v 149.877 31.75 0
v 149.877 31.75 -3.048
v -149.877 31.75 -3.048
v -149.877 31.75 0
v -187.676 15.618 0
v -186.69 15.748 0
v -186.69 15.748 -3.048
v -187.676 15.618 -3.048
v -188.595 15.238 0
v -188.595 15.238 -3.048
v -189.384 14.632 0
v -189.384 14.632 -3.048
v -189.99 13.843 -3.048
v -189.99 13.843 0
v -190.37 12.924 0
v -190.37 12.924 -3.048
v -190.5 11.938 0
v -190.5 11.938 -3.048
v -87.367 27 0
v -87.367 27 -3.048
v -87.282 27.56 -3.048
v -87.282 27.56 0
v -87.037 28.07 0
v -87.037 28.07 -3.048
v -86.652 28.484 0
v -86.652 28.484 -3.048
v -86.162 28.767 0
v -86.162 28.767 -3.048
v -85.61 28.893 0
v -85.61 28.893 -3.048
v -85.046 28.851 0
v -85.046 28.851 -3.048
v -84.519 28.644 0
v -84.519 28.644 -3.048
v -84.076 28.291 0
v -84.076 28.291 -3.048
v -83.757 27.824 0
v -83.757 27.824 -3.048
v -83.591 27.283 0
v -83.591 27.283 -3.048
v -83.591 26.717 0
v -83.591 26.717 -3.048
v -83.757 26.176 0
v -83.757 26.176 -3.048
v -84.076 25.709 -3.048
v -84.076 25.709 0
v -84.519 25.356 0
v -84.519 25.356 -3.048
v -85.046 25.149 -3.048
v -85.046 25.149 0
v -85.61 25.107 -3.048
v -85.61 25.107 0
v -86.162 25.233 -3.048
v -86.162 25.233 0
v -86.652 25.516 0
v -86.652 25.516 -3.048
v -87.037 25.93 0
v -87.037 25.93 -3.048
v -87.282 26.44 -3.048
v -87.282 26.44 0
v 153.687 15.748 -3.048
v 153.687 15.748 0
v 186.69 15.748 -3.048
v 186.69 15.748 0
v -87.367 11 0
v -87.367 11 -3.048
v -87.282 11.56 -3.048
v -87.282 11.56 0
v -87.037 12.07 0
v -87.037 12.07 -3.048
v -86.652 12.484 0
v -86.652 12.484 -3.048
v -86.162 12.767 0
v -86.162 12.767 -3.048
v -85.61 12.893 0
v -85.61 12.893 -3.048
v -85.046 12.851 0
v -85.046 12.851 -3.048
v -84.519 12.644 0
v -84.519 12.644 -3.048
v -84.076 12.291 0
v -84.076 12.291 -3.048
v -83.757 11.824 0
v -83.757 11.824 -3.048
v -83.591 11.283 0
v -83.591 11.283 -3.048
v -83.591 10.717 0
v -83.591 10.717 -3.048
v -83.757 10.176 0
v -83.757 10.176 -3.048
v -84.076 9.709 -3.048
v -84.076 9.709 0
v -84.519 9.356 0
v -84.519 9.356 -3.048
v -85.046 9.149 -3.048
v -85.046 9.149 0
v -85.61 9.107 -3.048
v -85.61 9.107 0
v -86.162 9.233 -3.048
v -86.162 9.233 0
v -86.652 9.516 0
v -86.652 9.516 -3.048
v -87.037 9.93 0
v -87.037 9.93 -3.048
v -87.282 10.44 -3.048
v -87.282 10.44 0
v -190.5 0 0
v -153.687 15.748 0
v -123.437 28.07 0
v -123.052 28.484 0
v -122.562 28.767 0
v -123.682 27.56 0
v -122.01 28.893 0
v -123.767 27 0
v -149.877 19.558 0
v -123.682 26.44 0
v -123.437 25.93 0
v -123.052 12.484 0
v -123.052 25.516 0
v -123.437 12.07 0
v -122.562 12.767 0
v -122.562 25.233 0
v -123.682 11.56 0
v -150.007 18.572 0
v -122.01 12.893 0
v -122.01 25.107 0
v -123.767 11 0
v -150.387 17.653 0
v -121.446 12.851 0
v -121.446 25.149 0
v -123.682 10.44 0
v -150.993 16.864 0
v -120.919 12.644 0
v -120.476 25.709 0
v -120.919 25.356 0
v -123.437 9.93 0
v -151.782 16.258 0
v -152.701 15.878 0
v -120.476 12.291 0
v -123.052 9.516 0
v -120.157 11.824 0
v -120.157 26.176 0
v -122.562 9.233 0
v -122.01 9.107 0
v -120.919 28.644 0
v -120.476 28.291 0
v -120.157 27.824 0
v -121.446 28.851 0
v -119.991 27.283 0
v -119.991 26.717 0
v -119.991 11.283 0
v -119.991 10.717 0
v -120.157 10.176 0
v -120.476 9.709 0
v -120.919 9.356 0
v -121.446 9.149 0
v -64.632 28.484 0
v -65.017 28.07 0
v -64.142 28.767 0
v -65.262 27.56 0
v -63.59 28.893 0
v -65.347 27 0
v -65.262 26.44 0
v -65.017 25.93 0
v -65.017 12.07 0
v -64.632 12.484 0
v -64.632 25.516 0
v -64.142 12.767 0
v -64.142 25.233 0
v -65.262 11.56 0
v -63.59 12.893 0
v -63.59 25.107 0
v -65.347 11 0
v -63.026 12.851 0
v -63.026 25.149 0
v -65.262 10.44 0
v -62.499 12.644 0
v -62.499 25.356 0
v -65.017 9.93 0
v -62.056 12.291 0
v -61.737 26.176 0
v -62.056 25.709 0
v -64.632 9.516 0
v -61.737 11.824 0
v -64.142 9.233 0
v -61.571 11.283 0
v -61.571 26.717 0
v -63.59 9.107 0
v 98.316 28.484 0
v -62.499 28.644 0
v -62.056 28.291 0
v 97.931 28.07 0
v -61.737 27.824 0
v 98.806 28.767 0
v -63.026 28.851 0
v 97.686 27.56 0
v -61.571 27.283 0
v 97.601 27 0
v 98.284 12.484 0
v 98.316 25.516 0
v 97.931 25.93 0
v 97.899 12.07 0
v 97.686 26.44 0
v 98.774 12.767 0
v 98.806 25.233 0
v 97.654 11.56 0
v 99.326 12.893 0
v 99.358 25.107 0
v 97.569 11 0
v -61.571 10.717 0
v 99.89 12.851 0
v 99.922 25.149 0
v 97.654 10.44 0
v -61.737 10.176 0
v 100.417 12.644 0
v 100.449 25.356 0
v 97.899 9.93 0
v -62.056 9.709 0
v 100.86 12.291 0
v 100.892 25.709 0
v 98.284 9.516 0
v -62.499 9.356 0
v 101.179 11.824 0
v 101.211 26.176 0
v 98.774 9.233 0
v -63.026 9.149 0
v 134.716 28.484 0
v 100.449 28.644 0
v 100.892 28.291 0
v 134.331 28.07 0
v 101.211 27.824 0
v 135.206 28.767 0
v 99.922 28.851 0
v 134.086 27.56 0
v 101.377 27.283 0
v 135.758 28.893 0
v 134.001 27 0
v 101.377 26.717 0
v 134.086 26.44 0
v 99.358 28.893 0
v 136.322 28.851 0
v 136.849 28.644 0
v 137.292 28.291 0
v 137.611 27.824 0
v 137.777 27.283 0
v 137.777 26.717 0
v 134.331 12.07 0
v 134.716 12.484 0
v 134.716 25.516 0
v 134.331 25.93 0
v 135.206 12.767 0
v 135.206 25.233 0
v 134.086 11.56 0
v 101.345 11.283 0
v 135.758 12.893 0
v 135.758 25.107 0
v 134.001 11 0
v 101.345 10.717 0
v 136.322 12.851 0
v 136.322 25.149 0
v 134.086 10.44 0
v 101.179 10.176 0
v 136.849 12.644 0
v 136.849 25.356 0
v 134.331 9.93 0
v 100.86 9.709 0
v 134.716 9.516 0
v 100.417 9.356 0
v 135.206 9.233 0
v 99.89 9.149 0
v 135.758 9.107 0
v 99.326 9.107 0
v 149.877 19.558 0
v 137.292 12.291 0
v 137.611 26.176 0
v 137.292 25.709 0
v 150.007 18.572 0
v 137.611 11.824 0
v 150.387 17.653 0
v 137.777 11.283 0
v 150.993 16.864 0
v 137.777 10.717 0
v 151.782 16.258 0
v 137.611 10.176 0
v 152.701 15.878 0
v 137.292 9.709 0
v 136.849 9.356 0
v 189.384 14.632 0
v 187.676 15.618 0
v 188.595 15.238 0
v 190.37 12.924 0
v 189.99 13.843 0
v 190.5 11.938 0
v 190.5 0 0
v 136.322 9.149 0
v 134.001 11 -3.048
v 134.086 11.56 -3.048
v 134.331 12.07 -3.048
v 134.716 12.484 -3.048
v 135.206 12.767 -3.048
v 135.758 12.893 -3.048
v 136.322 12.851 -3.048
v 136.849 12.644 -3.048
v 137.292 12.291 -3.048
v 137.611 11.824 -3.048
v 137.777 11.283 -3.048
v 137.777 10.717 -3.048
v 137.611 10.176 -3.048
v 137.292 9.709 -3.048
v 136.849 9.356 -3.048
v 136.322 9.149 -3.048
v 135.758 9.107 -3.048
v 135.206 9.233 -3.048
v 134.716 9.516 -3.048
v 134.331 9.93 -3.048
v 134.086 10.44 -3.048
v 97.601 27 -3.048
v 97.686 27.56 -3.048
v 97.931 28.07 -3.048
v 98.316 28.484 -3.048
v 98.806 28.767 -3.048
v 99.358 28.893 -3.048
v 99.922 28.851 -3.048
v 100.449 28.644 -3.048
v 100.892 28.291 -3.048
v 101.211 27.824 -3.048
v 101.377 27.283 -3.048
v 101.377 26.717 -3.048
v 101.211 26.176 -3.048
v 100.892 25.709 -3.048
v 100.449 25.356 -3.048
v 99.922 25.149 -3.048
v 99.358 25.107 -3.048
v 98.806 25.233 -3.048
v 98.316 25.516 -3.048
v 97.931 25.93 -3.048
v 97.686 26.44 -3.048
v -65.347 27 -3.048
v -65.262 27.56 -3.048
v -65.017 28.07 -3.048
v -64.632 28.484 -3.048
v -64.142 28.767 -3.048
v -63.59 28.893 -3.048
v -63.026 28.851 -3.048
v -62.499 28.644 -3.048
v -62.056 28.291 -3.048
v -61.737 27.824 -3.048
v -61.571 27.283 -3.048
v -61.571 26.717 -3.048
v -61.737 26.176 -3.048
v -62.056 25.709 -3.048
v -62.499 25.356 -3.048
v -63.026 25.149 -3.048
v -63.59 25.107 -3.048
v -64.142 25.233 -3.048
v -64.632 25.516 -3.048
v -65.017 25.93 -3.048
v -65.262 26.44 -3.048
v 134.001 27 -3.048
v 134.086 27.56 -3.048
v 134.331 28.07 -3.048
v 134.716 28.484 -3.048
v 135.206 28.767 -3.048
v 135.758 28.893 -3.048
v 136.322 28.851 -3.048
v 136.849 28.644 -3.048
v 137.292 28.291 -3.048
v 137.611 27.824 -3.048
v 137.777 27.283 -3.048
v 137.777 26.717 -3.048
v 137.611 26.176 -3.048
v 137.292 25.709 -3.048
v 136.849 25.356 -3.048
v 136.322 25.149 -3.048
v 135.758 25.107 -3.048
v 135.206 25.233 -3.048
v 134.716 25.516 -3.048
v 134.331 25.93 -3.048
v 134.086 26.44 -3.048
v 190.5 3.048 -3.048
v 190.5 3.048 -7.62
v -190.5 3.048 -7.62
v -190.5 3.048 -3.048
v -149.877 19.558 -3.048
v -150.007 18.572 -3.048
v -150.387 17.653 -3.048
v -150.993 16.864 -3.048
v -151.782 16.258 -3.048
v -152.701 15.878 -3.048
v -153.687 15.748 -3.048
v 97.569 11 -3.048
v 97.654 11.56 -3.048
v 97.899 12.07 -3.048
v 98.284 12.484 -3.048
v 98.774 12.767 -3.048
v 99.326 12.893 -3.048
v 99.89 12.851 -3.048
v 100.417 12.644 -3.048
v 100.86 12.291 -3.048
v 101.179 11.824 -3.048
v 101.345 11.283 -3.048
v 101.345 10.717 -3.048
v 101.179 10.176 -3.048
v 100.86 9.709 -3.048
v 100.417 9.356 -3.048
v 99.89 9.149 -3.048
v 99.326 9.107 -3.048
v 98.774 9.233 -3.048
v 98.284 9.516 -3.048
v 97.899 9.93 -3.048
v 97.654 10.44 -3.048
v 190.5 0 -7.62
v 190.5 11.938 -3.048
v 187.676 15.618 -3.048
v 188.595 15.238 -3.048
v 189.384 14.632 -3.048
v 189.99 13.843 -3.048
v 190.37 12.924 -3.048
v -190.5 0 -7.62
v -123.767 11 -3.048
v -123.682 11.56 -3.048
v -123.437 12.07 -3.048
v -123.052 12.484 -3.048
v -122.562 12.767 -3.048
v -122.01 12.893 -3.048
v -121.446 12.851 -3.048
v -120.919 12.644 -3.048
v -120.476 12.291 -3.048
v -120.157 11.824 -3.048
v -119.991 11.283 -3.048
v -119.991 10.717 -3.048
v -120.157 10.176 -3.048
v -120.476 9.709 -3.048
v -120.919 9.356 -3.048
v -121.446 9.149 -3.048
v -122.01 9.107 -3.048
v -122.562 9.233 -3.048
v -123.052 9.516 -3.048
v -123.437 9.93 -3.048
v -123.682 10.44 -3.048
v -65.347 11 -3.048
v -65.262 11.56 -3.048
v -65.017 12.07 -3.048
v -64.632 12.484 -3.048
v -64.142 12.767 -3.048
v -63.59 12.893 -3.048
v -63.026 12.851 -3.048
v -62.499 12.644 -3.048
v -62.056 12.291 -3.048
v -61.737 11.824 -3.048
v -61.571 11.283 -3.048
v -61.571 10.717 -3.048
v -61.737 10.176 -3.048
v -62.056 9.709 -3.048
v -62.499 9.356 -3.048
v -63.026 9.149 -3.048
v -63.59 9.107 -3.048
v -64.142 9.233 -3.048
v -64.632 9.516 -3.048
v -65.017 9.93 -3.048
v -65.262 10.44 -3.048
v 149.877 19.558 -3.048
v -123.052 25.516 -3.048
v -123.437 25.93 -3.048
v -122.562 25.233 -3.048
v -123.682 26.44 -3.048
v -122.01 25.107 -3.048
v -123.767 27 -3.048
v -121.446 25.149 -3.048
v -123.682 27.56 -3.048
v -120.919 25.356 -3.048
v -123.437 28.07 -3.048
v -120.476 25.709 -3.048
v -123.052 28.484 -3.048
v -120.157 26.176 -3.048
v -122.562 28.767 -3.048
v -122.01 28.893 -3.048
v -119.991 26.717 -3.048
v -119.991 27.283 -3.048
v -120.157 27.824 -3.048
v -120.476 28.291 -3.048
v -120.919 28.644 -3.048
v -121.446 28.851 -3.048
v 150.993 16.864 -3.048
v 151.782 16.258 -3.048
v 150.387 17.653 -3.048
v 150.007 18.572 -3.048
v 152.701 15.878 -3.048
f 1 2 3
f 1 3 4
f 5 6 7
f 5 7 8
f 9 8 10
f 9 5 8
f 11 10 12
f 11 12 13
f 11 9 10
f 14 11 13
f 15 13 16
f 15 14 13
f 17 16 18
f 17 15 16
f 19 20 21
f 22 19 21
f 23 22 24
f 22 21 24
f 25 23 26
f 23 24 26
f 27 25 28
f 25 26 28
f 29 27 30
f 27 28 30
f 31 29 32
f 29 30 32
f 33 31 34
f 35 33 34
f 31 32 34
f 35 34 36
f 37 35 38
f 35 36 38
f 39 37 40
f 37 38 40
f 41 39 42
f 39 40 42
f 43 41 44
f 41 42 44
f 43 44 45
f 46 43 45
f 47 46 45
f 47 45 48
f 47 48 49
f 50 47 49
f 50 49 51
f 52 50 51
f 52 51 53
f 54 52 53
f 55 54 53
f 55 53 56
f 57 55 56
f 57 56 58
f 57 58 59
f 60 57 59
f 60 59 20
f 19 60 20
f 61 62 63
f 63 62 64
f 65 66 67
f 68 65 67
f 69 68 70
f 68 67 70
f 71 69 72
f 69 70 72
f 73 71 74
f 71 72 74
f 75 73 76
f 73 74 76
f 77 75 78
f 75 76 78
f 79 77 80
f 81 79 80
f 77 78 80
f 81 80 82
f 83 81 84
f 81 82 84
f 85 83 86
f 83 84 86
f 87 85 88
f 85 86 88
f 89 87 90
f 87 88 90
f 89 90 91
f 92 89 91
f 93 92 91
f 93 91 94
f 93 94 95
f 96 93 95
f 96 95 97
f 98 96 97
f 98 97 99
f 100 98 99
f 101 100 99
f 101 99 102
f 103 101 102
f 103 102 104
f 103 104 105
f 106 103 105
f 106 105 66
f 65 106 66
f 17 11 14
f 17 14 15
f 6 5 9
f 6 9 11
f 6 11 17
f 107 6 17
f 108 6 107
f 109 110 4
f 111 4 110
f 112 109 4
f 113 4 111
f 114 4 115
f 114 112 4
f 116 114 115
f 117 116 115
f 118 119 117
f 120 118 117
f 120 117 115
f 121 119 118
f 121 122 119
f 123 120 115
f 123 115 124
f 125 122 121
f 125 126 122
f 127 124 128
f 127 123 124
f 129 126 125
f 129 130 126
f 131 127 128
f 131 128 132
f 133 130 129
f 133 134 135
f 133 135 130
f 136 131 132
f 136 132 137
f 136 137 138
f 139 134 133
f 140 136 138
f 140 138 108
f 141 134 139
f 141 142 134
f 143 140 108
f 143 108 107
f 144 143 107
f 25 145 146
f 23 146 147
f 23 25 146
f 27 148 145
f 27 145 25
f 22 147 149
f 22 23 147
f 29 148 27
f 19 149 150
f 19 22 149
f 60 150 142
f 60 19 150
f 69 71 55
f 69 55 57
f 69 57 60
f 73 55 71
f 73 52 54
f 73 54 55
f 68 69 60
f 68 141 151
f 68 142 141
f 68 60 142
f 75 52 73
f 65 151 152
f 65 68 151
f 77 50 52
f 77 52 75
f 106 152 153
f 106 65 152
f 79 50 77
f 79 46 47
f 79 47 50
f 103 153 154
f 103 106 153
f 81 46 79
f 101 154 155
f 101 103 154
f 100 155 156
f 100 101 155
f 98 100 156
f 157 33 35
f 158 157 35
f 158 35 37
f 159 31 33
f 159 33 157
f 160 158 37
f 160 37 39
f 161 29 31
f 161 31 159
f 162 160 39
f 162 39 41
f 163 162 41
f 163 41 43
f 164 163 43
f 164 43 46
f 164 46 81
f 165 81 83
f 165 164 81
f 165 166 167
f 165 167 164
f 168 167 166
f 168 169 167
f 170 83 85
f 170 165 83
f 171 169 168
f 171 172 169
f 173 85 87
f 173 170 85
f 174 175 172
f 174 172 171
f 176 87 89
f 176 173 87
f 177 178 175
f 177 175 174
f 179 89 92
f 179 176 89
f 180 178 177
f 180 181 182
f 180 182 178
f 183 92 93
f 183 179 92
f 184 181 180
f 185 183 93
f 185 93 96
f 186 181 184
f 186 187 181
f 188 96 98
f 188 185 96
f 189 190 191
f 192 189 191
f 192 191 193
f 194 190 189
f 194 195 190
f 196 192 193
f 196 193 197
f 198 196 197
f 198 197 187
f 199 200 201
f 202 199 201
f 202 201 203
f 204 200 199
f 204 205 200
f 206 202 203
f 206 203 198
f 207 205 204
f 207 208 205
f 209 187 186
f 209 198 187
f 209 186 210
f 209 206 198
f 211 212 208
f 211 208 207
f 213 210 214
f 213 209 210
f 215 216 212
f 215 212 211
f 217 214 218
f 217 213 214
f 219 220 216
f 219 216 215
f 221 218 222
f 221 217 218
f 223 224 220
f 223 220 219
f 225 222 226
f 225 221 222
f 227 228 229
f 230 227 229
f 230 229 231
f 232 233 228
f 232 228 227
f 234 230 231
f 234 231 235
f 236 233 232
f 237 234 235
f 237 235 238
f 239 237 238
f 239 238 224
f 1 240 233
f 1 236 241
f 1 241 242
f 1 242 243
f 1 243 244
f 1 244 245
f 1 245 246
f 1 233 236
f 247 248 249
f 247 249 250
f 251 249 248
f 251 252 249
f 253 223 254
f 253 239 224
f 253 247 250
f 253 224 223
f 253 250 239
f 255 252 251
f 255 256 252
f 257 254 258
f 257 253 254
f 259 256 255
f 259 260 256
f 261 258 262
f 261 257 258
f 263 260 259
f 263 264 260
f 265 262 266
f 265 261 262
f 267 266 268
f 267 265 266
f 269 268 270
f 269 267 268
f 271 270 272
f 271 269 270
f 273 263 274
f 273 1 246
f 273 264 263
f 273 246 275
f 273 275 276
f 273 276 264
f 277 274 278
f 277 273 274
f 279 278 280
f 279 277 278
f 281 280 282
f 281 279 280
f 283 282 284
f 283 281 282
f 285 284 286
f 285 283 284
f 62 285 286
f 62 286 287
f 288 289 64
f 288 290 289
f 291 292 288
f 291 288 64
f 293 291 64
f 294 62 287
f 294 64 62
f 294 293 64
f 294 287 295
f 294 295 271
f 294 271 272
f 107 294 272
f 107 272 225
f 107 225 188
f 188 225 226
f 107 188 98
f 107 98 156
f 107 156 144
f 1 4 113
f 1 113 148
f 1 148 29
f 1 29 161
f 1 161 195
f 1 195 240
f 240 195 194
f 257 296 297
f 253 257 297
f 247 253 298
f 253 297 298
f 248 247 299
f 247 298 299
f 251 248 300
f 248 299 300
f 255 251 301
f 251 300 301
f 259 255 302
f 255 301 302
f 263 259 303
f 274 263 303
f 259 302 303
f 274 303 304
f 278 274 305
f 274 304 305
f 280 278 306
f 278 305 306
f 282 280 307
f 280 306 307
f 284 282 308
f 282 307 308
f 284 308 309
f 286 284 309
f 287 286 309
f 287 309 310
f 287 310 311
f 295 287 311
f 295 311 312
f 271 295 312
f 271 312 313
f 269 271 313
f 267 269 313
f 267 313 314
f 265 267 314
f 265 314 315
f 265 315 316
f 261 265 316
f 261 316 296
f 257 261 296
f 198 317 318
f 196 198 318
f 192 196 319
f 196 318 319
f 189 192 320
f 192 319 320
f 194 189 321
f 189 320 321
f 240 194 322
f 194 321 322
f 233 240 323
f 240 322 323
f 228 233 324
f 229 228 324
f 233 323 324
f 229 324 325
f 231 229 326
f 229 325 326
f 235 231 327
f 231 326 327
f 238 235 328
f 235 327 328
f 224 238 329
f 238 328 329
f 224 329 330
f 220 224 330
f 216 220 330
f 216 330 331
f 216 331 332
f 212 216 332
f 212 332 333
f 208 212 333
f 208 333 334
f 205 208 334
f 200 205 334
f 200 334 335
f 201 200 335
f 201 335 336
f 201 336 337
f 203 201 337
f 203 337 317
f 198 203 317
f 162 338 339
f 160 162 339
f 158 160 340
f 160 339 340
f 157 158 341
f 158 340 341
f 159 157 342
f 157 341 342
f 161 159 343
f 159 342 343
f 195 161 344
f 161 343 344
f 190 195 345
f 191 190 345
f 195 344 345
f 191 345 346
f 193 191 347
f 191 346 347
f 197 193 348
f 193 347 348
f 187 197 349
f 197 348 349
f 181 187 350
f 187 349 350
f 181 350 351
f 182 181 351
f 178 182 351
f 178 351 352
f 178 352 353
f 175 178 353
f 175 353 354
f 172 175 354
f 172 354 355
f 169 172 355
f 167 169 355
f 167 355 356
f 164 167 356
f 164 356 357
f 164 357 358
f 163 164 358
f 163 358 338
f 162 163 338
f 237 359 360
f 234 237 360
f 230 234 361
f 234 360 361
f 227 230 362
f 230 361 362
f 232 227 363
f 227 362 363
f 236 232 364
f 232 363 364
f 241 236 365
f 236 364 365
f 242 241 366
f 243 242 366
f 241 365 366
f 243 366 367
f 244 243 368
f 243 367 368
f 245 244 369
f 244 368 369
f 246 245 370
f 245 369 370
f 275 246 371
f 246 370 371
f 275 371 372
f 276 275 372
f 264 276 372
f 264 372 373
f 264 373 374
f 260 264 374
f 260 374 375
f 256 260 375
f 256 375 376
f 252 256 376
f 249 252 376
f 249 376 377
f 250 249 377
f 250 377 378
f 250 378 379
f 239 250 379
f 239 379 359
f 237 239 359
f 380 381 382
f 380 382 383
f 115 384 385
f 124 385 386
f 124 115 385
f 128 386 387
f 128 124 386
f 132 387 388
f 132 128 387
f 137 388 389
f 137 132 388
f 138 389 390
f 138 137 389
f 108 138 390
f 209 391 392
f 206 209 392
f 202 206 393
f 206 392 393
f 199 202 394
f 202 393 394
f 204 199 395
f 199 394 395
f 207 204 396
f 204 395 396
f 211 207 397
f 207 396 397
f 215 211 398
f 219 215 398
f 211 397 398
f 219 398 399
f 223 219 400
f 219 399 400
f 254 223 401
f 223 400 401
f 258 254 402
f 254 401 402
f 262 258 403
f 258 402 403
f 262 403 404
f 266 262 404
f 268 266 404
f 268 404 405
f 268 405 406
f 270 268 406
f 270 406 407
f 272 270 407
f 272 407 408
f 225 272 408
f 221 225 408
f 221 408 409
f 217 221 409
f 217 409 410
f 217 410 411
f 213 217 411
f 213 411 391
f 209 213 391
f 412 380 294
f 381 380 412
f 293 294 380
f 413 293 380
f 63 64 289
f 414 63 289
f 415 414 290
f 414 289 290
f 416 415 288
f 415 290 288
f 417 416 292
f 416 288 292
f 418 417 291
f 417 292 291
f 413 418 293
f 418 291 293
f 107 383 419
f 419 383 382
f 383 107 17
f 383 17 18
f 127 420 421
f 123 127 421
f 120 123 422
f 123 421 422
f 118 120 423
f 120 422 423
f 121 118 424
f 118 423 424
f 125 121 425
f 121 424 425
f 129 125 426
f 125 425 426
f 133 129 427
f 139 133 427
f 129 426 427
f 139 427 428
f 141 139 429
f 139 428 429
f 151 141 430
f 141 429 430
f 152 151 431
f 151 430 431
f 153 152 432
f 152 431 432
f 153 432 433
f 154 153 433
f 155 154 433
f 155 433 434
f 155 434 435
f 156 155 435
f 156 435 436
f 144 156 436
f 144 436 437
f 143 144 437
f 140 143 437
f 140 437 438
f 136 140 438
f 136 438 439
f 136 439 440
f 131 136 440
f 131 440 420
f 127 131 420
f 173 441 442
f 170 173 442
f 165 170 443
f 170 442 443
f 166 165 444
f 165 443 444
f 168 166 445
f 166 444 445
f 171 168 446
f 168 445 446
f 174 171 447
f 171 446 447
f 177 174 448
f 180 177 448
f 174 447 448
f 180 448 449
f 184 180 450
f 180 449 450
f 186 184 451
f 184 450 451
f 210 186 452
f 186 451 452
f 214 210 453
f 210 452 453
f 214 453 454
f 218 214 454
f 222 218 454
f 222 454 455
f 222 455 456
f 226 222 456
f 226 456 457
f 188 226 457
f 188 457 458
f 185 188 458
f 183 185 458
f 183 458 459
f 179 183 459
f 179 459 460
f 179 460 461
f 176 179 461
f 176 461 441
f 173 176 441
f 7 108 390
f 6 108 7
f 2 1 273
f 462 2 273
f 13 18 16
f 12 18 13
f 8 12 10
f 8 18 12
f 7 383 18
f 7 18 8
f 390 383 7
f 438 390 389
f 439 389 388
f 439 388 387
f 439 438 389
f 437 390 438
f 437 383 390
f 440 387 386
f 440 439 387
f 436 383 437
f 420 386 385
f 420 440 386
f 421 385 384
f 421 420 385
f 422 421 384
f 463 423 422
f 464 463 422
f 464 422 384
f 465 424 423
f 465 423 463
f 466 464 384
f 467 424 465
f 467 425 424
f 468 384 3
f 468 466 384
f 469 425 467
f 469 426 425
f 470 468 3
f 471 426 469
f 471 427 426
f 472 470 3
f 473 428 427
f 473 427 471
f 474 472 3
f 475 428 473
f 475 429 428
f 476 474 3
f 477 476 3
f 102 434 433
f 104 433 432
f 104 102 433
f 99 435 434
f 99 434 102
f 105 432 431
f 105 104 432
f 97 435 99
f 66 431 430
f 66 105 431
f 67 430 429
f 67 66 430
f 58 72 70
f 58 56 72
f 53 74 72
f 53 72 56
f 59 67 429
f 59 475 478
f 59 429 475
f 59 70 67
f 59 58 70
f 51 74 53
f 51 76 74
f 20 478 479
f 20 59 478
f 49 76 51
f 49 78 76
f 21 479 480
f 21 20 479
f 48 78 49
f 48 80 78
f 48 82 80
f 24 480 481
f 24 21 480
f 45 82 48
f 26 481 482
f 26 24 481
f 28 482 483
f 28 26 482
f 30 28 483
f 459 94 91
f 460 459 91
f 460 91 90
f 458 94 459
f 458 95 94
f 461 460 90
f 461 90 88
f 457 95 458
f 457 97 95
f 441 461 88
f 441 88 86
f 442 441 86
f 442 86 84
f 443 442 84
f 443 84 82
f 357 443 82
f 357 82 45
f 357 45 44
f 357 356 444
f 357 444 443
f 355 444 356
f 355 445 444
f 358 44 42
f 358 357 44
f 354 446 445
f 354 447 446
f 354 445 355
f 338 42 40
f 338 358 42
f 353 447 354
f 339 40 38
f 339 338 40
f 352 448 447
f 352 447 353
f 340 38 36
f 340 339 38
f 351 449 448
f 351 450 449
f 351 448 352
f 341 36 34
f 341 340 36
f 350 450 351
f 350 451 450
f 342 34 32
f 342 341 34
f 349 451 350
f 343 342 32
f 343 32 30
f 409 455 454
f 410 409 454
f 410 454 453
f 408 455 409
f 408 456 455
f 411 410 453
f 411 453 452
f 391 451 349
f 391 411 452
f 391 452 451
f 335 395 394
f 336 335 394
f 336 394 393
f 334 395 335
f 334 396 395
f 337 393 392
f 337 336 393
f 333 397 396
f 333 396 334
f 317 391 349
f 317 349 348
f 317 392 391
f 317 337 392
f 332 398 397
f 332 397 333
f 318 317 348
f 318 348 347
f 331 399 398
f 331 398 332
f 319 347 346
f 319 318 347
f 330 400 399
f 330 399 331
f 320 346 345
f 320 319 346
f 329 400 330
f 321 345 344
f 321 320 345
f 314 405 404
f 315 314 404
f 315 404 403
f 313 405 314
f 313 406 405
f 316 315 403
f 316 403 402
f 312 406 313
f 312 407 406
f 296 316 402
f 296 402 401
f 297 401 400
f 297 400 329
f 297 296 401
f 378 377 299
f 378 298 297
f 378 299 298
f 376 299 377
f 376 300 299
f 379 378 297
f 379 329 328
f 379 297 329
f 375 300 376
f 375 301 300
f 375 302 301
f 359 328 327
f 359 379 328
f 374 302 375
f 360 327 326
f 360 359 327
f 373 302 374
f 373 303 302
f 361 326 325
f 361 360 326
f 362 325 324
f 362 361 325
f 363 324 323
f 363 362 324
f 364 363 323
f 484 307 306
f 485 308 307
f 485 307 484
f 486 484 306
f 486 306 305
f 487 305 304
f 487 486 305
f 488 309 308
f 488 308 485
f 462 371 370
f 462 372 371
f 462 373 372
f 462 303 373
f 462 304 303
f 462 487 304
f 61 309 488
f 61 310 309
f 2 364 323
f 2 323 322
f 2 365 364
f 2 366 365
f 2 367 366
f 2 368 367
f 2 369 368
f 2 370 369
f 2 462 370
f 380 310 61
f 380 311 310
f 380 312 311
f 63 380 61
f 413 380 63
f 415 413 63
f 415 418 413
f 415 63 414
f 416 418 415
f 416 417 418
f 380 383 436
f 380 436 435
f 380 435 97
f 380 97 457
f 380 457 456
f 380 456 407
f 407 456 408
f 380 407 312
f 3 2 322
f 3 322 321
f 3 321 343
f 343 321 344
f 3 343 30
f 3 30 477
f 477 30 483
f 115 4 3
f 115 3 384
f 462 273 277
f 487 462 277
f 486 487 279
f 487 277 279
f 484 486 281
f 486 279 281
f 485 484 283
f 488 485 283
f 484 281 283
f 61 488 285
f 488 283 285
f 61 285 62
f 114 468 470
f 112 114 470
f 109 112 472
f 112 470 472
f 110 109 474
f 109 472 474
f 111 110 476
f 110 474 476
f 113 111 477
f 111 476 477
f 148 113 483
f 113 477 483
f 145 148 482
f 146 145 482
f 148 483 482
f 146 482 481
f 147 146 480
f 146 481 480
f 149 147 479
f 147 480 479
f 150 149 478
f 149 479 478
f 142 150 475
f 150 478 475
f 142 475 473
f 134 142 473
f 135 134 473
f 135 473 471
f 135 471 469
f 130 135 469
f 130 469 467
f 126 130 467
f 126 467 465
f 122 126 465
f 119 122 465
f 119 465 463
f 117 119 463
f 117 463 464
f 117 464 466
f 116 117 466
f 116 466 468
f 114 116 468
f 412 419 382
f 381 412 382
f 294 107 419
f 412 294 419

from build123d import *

# Parameters (mm, degrees)
BOSS_EXTRUDE1_DEPTH     = 190.5
F_6_CLEARANCE_HOLE1_D   = 3.7973
CUT_EXTRUDE1_DEPTH      = 32.75
SKETCH6_W               = 25.4
SKETCH6_H               = 15.24
CUT_EXTRUDE2_DEPTH      = 191.5
CUT_EXTRUDE2_DEPTH_BACK = 191.5
F_6_CLEARANCE_HOLE2_D   = 3.7973


with BuildPart() as part:
    # Sketch1 → Boss-Extrude1 (new body, symmetric)
    with BuildSketch(Plane(origin=(0, 0, 0), x_dir=(0, 0, -1), z_dir=(1, 0, 0))):
        Polygon((0, 0), (31.75, 0), (31.75, 3.048), (3.048, 3.048), (3.048, 31.75), (0, 31.75), align=None)
    extrude(amount=BOSS_EXTRUDE1_DEPTH, both=True)

    # #6 Clearance Hole1 (through all)
    with Locations(Plane.XY):
        with Locations((135.9, 27), (135.9, 11), (99.5, 27), (99.468, 11), (-121.868, 27), (-121.868, 11), (-85.468, 11), (-85.468, 27)):
            Hole(F_6_CLEARANCE_HOLE1_D / 2)

    # Sketch5 → Cut-Extrude1 (cut, through all)
    with BuildSketch(Plane.XY):
        with BuildLine():
            Line((149.877, 41.148), (149.877, 19.558))
            ThreePointArc((149.877, 19.558), (150.992923164, 16.863923164), (153.687, 15.748))
            Line((153.687, 15.748), (186.69, 15.748))
            ThreePointArc((186.69, 15.748), (189.384076836, 14.632076836), (190.5, 11.938))
            Line((190.5, 11.938), (190.5, -9.652))
            Line((190.5, -9.652), (198.12, -9.652))
            Line((198.12, -9.652), (198.12, 41.148))
            Line((198.12, 41.148), (149.877, 41.148))
        make_face()
        with BuildLine():
            Line((-198.12, 41.148), (-149.877, 41.148))
            Line((-149.877, 41.148), (-149.877, 19.558))
            ThreePointArc((-149.877, 19.558), (-150.992923164, 16.863923164), (-153.687, 15.748))
            Line((-153.687, 15.748), (-186.69, 15.748))
            ThreePointArc((-186.69, 15.748), (-189.384076836, 14.632076836), (-190.5, 11.938))
            Line((-190.5, 11.938), (-190.5, -9.652))
            Line((-190.5, -9.652), (-198.12, -9.652))
            Line((-198.12, -9.652), (-198.12, 41.148))
        make_face()
    extrude(amount=-CUT_EXTRUDE1_DEPTH, mode=Mode.SUBTRACT)

    # Sketch6 → Cut-Extrude2 (cut, two sides)
    with BuildSketch(Plane(origin=(0, 0, 0), x_dir=(0, 0, -1), z_dir=(1, 0, 0))) as cut_extrude2_sk:
        with Locations((20.32, 0)):
            Rectangle(SKETCH6_W, SKETCH6_H)
    extrude(amount=CUT_EXTRUDE2_DEPTH, mode=Mode.SUBTRACT)
    extrude(cut_extrude2_sk.sketch, amount=-CUT_EXTRUDE2_DEPTH_BACK, mode=Mode.SUBTRACT)

    # #6 Clearance Hole2 (through all)
    with Locations(Plane.XY):
        with Locations((-63.448, 27), (-63.448, 11)):
            Hole(F_6_CLEARANCE_HOLE2_D / 2)


solid = part.part
